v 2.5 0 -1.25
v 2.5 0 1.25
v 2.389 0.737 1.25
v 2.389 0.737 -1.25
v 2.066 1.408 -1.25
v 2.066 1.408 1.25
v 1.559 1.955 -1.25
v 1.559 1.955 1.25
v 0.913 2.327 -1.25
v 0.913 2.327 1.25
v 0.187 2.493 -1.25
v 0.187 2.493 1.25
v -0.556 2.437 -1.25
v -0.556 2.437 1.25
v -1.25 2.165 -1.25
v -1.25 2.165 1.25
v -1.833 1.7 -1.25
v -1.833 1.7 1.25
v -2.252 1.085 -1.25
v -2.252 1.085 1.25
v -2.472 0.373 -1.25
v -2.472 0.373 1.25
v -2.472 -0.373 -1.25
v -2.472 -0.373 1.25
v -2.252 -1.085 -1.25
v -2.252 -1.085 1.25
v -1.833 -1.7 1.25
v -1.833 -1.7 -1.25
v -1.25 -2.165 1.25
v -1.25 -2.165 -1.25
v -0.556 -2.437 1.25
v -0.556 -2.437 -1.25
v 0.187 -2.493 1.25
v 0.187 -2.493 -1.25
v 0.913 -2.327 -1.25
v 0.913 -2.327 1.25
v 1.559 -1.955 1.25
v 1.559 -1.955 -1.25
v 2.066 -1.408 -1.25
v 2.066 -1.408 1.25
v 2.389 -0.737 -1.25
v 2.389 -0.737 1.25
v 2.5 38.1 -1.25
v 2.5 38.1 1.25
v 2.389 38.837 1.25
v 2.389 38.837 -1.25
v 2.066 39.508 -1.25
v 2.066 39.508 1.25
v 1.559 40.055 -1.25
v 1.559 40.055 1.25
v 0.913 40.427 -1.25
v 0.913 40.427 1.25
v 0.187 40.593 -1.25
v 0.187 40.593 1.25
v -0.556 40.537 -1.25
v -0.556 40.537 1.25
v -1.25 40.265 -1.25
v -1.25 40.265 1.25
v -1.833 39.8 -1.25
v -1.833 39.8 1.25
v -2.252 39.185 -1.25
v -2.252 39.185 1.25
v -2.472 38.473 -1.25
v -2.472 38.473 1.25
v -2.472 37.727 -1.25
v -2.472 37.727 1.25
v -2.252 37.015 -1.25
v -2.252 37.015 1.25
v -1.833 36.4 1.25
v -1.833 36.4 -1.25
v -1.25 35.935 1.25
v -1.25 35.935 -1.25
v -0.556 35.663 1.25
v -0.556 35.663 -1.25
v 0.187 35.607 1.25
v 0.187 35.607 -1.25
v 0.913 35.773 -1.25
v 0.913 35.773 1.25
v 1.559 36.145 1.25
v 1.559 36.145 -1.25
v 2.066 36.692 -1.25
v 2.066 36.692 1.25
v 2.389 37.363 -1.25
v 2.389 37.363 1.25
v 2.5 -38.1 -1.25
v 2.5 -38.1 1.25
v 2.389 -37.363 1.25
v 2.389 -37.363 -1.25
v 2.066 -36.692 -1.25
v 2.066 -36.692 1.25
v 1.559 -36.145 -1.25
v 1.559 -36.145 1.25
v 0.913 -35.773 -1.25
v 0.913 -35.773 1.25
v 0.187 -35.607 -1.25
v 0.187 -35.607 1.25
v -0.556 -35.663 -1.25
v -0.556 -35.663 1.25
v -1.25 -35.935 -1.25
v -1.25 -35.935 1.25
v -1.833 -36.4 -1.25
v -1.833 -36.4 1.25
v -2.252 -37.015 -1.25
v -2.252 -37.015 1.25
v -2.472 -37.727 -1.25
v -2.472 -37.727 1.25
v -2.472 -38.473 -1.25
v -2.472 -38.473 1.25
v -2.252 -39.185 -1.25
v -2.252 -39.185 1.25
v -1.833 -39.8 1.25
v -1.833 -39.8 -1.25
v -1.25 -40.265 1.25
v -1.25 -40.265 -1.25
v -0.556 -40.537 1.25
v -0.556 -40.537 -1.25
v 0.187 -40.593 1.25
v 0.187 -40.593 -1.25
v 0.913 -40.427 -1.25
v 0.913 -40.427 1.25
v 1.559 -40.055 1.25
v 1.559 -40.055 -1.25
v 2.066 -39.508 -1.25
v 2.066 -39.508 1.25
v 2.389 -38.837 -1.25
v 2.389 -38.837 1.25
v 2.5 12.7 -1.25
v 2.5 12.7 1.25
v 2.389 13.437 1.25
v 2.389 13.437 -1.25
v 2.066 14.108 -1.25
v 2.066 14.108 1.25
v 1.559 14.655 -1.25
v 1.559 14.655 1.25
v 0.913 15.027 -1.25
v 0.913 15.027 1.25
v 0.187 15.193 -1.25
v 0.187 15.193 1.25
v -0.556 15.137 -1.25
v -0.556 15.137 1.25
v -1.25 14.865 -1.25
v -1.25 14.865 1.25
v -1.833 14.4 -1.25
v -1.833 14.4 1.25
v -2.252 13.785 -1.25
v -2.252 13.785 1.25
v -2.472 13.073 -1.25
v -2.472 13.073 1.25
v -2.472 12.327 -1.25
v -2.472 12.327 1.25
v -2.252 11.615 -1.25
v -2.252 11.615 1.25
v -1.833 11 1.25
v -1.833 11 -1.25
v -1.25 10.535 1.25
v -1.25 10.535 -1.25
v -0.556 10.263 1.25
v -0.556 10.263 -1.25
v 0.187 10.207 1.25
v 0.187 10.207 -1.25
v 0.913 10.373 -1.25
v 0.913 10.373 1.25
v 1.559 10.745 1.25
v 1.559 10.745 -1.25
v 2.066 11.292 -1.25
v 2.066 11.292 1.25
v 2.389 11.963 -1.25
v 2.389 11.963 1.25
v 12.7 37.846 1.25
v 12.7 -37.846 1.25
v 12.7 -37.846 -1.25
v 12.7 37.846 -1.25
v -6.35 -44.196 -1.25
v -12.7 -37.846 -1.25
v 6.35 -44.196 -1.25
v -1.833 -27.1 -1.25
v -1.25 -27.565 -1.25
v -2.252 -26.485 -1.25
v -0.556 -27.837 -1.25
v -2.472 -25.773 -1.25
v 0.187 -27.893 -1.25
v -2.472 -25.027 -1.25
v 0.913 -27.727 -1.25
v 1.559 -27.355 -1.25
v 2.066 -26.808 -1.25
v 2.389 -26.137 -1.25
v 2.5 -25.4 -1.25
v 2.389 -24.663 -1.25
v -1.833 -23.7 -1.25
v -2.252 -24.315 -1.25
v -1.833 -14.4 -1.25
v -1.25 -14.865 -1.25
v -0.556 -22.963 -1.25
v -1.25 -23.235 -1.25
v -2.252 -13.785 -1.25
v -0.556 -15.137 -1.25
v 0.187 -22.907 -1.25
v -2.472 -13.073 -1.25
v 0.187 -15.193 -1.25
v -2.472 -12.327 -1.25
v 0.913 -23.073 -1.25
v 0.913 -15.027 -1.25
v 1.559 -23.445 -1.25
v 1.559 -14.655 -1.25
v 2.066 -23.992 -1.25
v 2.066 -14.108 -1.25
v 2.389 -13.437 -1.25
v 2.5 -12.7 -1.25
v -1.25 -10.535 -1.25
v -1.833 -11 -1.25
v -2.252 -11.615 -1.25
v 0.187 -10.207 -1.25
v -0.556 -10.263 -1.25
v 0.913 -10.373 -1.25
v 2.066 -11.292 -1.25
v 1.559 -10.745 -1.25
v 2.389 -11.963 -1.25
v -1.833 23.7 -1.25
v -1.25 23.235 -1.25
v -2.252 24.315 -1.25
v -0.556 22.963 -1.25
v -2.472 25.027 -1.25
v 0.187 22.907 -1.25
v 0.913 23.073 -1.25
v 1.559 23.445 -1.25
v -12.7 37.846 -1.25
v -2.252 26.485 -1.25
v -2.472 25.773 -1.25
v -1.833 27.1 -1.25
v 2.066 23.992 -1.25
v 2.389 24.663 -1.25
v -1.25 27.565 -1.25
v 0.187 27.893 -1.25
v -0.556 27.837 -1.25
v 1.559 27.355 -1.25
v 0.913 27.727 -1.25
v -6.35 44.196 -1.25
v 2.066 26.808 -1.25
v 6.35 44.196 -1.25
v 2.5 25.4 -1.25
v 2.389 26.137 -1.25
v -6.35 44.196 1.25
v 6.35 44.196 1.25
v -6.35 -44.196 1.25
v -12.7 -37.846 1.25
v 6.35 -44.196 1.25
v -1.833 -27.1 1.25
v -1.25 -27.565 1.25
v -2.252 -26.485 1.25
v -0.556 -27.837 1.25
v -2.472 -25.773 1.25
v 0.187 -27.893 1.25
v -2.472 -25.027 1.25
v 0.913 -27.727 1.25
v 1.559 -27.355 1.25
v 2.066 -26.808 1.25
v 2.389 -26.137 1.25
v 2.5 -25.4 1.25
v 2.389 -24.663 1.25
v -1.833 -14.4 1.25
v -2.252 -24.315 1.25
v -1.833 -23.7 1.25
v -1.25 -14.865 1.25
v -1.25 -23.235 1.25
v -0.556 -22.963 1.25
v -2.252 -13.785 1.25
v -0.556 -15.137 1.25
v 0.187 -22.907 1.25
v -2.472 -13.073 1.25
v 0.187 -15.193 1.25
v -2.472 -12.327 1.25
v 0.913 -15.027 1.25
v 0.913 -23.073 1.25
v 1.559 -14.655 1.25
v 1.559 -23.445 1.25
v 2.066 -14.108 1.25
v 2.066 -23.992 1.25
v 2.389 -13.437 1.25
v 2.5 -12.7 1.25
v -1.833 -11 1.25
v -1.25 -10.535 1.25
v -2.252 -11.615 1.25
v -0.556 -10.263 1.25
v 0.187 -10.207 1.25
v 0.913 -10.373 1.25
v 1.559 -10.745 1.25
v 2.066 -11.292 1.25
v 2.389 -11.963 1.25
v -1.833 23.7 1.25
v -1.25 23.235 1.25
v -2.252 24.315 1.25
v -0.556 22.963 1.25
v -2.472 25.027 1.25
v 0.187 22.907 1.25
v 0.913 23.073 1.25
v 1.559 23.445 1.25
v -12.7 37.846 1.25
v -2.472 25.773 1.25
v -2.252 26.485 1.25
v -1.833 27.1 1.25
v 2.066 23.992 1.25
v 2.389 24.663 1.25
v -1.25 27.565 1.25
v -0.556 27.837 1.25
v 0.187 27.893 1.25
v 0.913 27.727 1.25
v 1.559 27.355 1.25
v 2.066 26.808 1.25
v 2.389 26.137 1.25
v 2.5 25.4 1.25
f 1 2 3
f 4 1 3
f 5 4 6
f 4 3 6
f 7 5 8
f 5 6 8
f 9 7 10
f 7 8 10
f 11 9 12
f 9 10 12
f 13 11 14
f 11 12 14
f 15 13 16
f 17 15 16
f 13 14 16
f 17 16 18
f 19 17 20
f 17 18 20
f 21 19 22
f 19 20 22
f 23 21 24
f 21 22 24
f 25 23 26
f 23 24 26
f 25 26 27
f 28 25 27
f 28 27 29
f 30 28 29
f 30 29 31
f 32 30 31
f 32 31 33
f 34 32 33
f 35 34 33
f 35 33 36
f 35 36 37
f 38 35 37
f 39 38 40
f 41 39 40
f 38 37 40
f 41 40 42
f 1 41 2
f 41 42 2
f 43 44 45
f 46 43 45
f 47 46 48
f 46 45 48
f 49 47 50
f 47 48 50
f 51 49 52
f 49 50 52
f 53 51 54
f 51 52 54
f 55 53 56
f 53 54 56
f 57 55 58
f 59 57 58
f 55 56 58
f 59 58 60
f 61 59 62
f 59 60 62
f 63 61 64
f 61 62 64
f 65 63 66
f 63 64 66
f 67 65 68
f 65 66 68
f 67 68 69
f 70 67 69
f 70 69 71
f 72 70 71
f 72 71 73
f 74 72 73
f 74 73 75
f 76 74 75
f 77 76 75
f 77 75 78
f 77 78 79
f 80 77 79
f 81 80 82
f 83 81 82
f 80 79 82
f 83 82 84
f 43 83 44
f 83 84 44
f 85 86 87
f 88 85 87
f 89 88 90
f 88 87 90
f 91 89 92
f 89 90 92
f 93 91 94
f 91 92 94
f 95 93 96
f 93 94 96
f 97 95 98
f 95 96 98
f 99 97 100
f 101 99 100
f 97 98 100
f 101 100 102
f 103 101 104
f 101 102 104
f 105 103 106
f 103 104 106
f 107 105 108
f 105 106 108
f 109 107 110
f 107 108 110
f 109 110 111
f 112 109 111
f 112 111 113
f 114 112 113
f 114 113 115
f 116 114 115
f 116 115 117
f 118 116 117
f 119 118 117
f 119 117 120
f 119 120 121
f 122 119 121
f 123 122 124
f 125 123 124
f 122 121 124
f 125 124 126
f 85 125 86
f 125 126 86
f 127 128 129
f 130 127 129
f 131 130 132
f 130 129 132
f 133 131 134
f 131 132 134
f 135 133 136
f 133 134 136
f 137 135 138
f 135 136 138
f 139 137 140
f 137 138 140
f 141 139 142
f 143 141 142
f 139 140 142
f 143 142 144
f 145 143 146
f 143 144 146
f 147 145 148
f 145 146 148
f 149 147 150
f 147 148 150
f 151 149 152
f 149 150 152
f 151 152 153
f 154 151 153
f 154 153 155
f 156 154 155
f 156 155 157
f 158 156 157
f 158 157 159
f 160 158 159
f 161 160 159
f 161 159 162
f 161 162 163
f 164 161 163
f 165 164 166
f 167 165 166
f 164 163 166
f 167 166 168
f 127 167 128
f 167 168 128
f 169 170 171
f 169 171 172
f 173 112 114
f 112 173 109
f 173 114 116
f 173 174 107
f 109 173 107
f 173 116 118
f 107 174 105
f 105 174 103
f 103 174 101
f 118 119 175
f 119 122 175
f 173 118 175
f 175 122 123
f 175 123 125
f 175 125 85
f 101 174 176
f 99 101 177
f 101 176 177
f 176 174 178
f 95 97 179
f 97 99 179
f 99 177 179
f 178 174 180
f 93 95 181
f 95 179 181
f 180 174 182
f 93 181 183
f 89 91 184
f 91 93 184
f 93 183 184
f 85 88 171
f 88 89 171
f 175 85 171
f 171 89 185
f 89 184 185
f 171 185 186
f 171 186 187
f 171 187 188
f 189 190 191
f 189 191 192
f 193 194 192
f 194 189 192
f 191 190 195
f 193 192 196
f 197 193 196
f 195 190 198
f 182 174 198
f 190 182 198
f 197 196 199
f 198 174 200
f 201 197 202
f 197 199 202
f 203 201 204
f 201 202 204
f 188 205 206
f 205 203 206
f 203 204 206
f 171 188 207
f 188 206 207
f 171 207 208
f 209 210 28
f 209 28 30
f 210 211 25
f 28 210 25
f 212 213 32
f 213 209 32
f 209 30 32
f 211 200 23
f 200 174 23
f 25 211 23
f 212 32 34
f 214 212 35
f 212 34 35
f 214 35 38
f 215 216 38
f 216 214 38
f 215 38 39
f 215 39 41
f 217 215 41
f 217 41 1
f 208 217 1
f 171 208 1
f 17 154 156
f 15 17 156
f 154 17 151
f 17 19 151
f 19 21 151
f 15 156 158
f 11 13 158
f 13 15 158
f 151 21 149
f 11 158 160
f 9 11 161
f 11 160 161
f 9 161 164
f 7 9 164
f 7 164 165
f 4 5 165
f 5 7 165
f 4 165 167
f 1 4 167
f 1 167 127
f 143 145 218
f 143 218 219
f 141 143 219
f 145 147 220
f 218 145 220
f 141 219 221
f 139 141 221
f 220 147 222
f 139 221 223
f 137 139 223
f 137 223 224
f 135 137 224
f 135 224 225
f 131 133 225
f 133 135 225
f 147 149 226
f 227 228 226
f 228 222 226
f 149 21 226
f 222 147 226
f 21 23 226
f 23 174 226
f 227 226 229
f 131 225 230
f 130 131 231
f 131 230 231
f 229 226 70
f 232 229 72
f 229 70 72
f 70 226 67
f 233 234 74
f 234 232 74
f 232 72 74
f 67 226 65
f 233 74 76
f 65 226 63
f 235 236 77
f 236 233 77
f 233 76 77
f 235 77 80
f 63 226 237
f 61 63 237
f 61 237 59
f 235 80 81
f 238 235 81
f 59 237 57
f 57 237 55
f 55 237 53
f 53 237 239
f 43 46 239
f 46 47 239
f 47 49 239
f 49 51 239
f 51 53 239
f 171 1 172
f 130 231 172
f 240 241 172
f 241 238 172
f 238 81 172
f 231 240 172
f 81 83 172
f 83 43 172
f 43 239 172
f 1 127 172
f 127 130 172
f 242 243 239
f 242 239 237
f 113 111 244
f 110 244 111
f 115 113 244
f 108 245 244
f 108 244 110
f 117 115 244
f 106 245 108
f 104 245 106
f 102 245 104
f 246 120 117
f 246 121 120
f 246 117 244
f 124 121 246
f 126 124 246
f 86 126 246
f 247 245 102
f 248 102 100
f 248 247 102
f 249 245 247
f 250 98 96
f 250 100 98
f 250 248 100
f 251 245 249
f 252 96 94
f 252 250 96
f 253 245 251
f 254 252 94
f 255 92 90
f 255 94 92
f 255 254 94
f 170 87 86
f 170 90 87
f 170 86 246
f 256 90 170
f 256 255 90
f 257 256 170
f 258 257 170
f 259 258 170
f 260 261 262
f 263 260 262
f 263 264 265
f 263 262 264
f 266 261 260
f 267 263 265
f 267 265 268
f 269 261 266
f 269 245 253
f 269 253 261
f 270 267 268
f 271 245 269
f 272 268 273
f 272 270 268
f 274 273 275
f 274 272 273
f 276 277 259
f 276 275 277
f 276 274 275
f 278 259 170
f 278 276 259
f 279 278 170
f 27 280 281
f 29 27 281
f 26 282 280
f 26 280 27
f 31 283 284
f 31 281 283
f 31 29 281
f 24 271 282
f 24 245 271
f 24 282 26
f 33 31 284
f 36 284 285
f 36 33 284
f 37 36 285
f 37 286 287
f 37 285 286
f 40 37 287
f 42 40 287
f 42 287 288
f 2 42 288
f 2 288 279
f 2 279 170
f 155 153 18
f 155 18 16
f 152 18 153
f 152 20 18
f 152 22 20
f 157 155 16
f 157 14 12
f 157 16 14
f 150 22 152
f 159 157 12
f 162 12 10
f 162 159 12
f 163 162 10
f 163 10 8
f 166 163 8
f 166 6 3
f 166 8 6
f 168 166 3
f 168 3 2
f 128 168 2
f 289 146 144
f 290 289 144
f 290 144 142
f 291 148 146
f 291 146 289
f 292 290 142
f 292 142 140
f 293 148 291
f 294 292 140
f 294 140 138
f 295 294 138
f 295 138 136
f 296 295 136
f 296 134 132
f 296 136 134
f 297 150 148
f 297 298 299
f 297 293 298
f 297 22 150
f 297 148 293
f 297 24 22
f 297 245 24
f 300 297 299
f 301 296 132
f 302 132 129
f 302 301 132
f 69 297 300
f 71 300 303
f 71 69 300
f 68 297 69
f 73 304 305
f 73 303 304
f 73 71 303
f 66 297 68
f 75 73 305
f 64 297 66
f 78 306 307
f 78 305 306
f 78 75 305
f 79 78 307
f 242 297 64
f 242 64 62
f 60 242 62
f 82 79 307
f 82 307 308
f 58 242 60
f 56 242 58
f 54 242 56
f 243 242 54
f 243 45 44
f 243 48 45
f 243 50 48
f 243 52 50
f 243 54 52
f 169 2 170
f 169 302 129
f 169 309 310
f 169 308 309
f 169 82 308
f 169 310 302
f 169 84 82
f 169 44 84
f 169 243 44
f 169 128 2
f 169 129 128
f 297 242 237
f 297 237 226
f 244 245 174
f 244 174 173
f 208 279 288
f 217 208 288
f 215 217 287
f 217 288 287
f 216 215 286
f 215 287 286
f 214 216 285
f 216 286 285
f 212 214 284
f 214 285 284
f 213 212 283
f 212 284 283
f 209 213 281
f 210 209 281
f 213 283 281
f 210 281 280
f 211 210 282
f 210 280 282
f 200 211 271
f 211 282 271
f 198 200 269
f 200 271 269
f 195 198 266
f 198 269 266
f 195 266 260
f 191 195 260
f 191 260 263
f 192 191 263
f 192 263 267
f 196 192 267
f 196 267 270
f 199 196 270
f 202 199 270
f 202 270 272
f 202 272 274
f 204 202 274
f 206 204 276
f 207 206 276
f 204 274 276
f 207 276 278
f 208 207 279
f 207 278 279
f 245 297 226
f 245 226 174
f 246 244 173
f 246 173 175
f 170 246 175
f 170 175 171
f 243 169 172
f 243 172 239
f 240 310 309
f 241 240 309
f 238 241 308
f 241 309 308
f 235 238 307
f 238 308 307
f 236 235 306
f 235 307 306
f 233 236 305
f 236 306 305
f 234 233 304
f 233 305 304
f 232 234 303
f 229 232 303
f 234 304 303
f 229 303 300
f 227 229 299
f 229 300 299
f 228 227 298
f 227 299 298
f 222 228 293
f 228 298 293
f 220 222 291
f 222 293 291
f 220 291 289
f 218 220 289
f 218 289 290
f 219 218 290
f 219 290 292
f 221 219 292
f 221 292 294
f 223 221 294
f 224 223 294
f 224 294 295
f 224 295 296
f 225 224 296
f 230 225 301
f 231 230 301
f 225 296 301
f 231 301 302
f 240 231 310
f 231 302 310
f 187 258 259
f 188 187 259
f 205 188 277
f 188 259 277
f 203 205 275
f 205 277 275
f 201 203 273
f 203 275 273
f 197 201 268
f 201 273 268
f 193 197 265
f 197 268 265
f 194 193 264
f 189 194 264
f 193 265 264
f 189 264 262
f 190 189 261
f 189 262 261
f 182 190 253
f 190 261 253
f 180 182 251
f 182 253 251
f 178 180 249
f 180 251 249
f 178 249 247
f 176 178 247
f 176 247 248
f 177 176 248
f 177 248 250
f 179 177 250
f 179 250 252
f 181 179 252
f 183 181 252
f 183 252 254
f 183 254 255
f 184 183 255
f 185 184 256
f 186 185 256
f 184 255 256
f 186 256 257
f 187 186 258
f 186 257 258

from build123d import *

# Parameters (mm, degrees)
SKETCH1_R           = 2.5
BOSS_EXTRUDE1_DEPTH = 2.5


with BuildPart() as part:
    # Sketch1 → Boss-Extrude1 (new body)
    with BuildSketch(Plane.XY.offset(1.25)):
        Polygon((-12.7, 37.846), (-12.7, -37.846), (-6.35, -44.196), (6.35, -44.196), (12.7, -37.846), (12.7, 37.846), (6.35, 44.196), (-6.35, 44.196), align=None)
        with Locations((0, -38.1)):
            Circle(SKETCH1_R, mode=Mode.SUBTRACT)
        with Locations((0, -25.4)):
            Circle(SKETCH1_R, mode=Mode.SUBTRACT)
        with Locations((0, -12.7)):
            Circle(SKETCH1_R, mode=Mode.SUBTRACT)
        Circle(SKETCH1_R, mode=Mode.SUBTRACT)
        with Locations((0, 12.7)):
            Circle(SKETCH1_R, mode=Mode.SUBTRACT)
        with Locations((0, 38.1)):
            Circle(SKETCH1_R, mode=Mode.SUBTRACT)
        with Locations((0, 25.4)):
            Circle(SKETCH1_R, mode=Mode.SUBTRACT)
    extrude(amount=-BOSS_EXTRUDE1_DEPTH)


solid = part.part
